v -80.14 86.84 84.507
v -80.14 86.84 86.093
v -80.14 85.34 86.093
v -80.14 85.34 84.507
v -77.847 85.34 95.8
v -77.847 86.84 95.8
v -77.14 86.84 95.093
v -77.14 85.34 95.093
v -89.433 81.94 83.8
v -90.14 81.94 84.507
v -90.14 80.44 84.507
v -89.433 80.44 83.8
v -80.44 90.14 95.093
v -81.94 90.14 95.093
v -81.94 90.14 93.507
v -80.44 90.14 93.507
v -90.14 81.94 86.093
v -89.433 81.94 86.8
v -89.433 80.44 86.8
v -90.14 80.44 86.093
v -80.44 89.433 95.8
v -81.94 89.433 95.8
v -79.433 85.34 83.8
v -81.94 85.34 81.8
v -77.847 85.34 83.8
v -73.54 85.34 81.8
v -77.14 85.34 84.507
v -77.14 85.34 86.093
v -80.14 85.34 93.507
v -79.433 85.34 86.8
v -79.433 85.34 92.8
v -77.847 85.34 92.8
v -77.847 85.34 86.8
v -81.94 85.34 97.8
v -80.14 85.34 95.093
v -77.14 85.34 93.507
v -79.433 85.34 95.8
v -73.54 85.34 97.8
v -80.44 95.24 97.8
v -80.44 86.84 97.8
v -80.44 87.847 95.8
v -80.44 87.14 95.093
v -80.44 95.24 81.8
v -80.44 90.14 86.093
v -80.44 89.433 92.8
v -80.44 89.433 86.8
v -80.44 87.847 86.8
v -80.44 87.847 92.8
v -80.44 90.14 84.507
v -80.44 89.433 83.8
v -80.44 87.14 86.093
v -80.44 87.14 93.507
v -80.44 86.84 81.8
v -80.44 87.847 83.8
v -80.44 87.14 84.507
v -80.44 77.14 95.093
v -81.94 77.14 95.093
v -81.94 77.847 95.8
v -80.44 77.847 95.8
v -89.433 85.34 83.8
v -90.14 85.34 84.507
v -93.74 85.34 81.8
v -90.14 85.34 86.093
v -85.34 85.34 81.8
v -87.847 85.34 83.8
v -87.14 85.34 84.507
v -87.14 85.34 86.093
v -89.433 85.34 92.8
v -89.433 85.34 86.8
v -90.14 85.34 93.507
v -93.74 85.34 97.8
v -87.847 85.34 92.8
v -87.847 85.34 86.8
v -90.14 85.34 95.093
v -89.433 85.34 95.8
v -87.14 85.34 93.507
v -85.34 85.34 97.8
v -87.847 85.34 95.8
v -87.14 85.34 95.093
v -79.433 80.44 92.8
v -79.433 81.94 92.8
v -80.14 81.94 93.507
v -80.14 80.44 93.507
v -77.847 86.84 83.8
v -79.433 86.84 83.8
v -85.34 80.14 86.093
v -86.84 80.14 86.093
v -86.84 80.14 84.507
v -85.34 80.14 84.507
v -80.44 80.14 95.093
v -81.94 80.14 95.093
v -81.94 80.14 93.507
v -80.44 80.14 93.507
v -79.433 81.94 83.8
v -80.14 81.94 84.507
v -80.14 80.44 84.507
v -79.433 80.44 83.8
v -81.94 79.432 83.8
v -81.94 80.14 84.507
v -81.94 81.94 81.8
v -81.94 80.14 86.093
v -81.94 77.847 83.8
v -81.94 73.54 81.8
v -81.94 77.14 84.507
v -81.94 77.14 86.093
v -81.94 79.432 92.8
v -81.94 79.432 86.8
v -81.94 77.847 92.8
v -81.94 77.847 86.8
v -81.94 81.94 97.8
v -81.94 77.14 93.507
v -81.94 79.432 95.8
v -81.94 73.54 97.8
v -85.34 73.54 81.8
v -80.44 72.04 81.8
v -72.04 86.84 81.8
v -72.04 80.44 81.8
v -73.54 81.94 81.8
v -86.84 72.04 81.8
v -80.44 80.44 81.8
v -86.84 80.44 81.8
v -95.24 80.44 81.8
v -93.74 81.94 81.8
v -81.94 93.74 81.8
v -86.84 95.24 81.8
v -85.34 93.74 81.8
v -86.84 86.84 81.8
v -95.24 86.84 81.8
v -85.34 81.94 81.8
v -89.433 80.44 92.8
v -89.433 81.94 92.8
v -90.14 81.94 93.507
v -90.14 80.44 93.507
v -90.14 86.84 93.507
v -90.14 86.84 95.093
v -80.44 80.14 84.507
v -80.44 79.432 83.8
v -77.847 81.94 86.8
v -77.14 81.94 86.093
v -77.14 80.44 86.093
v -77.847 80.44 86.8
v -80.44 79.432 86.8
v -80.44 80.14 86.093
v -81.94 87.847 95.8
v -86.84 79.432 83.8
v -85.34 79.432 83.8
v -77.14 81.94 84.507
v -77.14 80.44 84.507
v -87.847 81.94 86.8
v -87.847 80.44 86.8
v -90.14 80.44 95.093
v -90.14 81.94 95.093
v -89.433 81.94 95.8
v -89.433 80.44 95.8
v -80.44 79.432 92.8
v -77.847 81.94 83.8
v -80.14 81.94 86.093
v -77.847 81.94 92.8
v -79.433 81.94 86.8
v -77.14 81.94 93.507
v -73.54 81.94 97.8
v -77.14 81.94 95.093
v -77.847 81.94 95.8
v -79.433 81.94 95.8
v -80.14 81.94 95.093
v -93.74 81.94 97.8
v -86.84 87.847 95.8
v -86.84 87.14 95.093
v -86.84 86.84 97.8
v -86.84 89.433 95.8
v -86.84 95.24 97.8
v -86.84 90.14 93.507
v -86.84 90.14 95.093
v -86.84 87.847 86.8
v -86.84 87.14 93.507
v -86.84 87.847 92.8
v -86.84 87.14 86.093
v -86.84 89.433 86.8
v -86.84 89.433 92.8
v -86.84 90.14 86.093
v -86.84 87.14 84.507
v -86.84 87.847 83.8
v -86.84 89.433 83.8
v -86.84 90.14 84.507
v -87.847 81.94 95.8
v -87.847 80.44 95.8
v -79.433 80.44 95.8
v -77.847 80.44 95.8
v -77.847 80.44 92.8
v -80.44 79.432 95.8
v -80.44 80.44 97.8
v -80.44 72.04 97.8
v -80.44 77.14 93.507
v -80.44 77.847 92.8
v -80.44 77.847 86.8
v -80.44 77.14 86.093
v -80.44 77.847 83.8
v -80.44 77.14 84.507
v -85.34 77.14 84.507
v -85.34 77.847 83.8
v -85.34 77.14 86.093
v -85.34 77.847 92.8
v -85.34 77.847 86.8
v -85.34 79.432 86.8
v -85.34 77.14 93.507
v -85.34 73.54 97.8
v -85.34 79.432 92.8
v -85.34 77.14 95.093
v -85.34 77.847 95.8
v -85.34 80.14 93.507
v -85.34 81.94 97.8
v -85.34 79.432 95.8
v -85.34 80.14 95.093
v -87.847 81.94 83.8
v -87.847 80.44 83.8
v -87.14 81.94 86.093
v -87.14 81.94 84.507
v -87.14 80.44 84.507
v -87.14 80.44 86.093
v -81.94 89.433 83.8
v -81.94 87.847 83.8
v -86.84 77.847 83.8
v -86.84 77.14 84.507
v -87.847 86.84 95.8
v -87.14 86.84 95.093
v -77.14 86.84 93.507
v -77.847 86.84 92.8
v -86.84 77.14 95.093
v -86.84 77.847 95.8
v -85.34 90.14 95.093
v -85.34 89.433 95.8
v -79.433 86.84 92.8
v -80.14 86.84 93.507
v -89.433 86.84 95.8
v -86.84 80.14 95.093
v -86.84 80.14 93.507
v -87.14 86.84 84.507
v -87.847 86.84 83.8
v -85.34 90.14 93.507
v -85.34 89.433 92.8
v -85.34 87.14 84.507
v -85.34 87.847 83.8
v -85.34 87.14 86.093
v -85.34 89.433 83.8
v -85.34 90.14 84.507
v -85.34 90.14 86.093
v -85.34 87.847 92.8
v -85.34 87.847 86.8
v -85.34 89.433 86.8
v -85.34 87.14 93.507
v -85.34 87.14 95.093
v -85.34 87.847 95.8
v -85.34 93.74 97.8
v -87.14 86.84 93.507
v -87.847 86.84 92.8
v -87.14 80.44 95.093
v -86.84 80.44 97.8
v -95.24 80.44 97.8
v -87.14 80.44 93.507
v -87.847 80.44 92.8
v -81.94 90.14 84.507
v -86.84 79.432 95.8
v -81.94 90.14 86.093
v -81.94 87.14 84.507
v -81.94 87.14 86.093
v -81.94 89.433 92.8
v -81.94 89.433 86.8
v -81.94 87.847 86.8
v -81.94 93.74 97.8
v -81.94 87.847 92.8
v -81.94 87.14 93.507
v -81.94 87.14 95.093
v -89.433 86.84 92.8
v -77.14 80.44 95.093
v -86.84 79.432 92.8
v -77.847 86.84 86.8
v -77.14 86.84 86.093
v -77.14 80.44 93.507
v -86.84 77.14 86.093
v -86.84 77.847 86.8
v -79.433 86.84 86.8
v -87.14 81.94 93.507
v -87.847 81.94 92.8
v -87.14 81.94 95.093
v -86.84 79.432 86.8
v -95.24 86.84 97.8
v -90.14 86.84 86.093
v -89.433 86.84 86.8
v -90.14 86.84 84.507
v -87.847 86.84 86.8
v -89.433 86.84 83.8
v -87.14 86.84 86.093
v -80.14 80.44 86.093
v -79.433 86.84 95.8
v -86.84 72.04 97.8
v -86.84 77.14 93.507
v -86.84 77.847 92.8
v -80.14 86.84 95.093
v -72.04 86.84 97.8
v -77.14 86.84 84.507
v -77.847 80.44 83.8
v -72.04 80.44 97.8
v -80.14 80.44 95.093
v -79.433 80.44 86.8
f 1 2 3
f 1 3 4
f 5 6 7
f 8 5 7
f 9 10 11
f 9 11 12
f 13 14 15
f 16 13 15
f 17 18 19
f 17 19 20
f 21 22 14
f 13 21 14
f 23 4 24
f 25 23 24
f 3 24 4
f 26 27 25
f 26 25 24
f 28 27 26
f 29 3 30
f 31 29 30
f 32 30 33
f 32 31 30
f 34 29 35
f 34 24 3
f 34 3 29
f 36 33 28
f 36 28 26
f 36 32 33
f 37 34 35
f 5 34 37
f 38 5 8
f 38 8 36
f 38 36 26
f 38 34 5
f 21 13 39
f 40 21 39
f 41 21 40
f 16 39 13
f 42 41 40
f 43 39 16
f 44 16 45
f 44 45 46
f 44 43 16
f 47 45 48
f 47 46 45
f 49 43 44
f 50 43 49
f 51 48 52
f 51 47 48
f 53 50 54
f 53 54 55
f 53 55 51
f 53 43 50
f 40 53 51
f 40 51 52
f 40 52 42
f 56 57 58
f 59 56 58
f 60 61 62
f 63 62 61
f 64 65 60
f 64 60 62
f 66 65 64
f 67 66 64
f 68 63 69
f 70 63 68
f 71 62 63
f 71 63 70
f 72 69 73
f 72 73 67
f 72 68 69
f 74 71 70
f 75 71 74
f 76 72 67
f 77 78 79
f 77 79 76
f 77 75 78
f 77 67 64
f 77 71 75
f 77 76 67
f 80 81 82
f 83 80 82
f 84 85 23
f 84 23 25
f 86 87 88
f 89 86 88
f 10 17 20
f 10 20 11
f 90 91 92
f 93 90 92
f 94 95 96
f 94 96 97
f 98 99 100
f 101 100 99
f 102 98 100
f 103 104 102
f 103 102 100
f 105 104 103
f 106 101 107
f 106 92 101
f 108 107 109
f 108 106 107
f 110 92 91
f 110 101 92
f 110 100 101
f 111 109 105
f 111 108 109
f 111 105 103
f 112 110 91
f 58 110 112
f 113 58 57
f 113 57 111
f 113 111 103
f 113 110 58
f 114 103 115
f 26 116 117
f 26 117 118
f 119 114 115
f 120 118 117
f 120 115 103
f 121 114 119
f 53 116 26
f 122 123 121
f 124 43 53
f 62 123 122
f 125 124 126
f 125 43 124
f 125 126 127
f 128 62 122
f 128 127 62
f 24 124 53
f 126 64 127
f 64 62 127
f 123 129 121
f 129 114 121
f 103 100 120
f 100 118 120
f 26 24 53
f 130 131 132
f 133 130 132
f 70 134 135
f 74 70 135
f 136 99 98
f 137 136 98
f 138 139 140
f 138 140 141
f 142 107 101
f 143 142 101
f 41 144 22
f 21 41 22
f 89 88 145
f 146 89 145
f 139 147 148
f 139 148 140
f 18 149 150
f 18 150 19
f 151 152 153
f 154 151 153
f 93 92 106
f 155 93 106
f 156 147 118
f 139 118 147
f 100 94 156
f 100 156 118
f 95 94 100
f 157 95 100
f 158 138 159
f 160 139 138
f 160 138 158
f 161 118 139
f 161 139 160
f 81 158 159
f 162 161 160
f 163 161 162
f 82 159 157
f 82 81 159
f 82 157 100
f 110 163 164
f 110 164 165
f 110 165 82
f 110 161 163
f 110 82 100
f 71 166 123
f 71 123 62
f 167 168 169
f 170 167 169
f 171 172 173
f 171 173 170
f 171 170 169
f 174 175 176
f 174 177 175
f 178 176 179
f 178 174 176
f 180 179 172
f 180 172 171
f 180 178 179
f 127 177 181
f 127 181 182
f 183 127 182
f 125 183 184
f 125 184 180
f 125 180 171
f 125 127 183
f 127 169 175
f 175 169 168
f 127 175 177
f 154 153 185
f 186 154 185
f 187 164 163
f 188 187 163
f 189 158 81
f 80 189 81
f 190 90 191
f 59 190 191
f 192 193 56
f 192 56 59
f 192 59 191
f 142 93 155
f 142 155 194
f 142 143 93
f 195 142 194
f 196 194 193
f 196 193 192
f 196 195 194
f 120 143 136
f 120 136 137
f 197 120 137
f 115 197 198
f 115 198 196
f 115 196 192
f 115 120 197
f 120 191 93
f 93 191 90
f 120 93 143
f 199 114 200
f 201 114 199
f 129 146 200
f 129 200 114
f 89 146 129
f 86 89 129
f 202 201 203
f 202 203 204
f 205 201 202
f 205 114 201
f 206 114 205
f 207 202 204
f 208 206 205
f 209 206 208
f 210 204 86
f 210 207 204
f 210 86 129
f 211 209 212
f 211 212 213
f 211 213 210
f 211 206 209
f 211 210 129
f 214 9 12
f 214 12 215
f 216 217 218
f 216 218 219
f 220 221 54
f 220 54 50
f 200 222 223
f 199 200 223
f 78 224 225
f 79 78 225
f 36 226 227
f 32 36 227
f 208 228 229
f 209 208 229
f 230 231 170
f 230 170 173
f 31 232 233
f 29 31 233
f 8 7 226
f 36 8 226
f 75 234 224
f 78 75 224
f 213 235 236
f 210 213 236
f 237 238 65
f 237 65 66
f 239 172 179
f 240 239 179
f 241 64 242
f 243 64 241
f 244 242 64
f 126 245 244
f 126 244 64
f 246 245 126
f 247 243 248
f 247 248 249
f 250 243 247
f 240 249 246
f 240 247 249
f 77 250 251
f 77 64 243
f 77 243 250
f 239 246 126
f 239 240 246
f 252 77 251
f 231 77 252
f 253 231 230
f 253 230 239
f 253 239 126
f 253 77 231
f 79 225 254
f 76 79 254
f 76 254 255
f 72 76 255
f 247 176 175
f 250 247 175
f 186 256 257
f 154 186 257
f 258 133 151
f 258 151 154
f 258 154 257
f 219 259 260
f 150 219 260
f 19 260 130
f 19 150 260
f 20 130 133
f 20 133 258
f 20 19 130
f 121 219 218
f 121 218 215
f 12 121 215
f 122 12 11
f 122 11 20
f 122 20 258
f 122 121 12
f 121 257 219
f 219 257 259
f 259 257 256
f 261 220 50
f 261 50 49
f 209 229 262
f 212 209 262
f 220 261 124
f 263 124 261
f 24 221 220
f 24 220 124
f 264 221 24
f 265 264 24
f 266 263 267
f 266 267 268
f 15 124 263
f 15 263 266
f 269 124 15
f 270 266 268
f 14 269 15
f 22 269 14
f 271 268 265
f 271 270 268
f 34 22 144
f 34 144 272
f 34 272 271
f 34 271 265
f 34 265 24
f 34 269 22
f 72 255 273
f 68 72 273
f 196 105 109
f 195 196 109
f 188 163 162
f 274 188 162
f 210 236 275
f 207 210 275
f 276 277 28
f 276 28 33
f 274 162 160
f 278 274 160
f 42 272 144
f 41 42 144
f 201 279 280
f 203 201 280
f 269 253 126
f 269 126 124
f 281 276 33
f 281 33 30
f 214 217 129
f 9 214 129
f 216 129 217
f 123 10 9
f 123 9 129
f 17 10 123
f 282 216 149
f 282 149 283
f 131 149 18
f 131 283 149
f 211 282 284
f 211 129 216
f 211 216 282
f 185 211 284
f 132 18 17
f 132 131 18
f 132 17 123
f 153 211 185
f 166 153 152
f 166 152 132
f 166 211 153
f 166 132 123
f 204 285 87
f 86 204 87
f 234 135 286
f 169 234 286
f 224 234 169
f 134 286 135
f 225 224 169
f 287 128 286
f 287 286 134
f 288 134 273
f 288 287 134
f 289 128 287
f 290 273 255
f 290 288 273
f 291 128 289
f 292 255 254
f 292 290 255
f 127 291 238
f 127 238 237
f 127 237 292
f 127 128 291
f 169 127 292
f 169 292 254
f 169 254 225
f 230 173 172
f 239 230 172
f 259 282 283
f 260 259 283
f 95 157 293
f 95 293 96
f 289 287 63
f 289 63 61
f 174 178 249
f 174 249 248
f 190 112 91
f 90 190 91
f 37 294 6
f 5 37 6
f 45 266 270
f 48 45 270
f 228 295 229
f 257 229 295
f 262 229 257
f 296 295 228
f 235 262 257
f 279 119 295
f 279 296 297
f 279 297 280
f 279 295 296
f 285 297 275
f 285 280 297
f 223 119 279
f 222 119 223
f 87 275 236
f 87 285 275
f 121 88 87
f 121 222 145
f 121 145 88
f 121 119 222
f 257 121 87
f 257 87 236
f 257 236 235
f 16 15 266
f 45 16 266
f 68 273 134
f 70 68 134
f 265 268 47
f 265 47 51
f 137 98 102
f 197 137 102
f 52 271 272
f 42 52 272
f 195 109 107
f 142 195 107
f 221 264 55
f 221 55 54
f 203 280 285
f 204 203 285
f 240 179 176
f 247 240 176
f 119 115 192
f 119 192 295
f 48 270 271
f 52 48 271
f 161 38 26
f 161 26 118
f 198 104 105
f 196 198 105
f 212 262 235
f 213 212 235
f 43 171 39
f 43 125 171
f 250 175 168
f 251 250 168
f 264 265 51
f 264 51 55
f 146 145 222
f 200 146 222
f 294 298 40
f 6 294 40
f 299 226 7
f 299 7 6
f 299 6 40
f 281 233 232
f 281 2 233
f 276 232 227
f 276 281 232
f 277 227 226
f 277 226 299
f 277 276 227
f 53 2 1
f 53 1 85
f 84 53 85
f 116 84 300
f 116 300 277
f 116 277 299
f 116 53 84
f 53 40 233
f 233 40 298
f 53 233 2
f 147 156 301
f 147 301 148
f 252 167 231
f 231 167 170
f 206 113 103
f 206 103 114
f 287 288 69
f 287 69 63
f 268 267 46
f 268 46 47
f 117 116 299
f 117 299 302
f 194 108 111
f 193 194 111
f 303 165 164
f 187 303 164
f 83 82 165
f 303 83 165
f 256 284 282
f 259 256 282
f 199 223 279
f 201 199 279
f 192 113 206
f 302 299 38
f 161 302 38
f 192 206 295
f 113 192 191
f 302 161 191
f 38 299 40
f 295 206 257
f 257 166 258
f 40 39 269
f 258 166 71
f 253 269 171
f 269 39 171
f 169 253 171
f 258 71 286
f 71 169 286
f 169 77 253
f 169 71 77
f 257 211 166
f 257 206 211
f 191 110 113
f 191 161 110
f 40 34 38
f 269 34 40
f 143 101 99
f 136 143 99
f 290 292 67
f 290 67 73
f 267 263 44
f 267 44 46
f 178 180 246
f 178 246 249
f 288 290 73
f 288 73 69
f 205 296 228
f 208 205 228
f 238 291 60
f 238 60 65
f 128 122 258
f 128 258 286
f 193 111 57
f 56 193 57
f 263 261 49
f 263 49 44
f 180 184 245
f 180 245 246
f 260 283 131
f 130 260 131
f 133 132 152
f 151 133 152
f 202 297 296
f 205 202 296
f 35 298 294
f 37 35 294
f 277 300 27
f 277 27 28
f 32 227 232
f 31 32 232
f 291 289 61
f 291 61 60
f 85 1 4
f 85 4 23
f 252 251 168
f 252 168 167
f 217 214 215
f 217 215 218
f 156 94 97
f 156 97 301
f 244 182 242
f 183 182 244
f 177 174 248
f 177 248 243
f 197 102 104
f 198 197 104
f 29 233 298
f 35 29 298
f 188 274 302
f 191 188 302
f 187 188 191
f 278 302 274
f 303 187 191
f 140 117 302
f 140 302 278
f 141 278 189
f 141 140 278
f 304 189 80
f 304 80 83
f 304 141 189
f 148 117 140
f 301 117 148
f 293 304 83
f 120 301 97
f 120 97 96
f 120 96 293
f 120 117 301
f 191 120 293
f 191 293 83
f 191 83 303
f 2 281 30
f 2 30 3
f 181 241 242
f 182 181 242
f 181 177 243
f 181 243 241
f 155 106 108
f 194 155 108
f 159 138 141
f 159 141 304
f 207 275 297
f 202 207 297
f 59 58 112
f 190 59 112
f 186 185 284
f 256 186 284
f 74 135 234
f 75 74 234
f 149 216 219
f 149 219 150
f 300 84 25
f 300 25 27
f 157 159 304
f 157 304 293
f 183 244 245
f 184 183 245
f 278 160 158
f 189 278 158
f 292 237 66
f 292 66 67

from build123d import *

# Parameters (mm, degrees)
PAD040_DEPTH    = 8
PAD041_DEPTH    = 8
POCKET029_DEPTH = 14.801
POCKET030_DEPTH = 14.801
POCKET031_DEPTH = 16.001


with BuildPart() as part:
    # Sketch069 (on Face4 of Binder015) → Pad040 (new body)
    with BuildSketch(Plane.XY.offset(89.8)):
        Polygon((-86.8396103068, 95.2396103068), (-80.4396103068, 95.2396103068), (-80.4396103068, 86.8396103068), (-72.0396103068, 86.8396103068), (-72.0396103068, 80.4396103068), (-80.4396103068, 80.4396103068), (-80.4396103068, 72.0396103068), (-86.8396103068, 72.0396103068), (-86.8396103068, 80.4396103068), (-95.2396103068, 80.4396103068), (-95.2396103068, 86.8396103068), (-86.8396103068, 86.8396103068), align=None)
    extrude(amount=-PAD040_DEPTH)

    # Sketch070 (on Face13 of Pad040) → Pad041 (join)
    with BuildSketch(Plane.XY.offset(89.8)):
        Polygon((-86.8396103068, 95.2396103068), (-80.4396103068, 95.2396103068), (-80.4396103068, 86.8396103068), (-72.0396103068, 86.8396103068), (-72.0396103068, 80.4396103068), (-80.4396103068, 80.4396103068), (-80.4396103068, 72.0396103068), (-86.8396103068, 72.0396103068), (-86.8396103068, 80.4396103068), (-95.2396103068, 80.4396103068), (-95.2396103068, 86.8396103068), (-86.8396103068, 86.8396103068), align=None)
    extrude(amount=PAD041_DEPTH)

    # Sketch071 (on Face5 of Pad041) → Pocket029 (cut, through all)
    with BuildSketch(Plane(origin=(-86.8396103068, 0, 0), x_dir=(0, -1, 0), z_dir=(-1, 0, 0))):
        Polygon((-89.4325218802, 86.8), (-87.8467354426, 86.8), (-87.1396286614, 86.0928932188), (-87.1396286614, 84.5071067812), (-87.8467354426, 83.8), (-89.4325218802, 83.8), (-90.1396286614, 84.5071067812), (-90.1396286614, 86.0928932188), align=None)
        Polygon((-80.1395919522, 86.0928932188), (-80.1395919522, 84.5071067812), (-79.432485171, 83.8), (-77.8466987333, 83.8), (-77.1395919522, 84.5071067812), (-77.1395919522, 86.0928932188), (-77.8466987333, 86.8), (-79.432485171, 86.8), align=None)
        Polygon((-89.4325218802, 92.8), (-87.8467354426, 92.8), (-87.1396286614, 93.5071067812), (-87.1396286614, 95.0928932188), (-87.8467354426, 95.8), (-89.4325218802, 95.8), (-90.1396286614, 95.0928932188), (-90.1396286614, 93.5071067812), align=None)
        Polygon((-77.8466987333, 95.8), (-79.432485171, 95.8), (-80.1395919522, 95.0928932188), (-80.1395919522, 93.5071067812), (-79.432485171, 92.8), (-77.8466987333, 92.8), (-77.1395919522, 93.5071067812), (-77.1395919522, 95.0928932188), align=None)
    extrude(amount=-POCKET029_DEPTH, mode=Mode.SUBTRACT)

    # Sketch072 (on Face4 of Pocket029) → Pocket030 (cut, through all)
    with BuildSketch(Plane(origin=(0, 86.8396103068, 0), x_dir=(-1, 0, 0), z_dir=(0, 1, 0))):
        Polygon((77.8467170496, 86.8), (79.4325034872, 86.8), (80.1396102684, 86.0928932188), (80.1396102684, 84.5071067812), (79.4325034872, 83.8), (77.8467170496, 83.8), (77.1396102684, 84.5071067812), (77.1396102684, 86.0928932188), align=None)
        Polygon((87.8467171264, 86.8), (89.432503564, 86.8), (90.1396103452, 86.0928932188), (90.1396103452, 84.5071067812), (89.432503564, 83.8), (87.8467171264, 83.8), (87.1396103452, 84.5071067812), (87.1396103452, 86.0928932188), align=None)
        Polygon((77.1396102684, 95.0928932188), (77.1396102684, 93.5071067812), (77.8467170496, 92.8), (79.4325034872, 92.8), (80.1396102684, 93.5071067812), (80.1396102684, 95.0928932188), (79.4325034872, 95.8), (77.8467170496, 95.8), align=None)
        Polygon((87.1396103452, 95.0928932188), (87.1396103452, 93.5071067812), (87.8467171264, 92.8), (89.432503564, 92.8), (90.1396103452, 93.5071067812), (90.1396103452, 95.0928932188), (89.432503564, 95.8), (87.8467171264, 95.8), align=None)
    extrude(amount=-POCKET030_DEPTH, mode=Mode.SUBTRACT)

    # Sketch073 (on Face1 of Pocket030) → Pocket031 (cut, through all)
    with BuildSketch(Plane.XY.offset(97.8)):
        Polygon((-85.3396103068, 93.7396103068), (-81.9396103068, 93.7396103068), (-81.9396103068, 85.3396103068), (-73.5396103068, 85.3396103068), (-73.5396103068, 81.9396103068), (-81.9396103068, 81.9396103068), (-81.9396103068, 73.5396103068), (-85.33961, 73.53961), (-85.33961, 81.93961), (-93.73961, 81.93961), (-93.73961, 85.33961), (-85.33961, 85.33961), align=None)
    extrude(amount=-POCKET031_DEPTH, mode=Mode.SUBTRACT)


solid = part.part
